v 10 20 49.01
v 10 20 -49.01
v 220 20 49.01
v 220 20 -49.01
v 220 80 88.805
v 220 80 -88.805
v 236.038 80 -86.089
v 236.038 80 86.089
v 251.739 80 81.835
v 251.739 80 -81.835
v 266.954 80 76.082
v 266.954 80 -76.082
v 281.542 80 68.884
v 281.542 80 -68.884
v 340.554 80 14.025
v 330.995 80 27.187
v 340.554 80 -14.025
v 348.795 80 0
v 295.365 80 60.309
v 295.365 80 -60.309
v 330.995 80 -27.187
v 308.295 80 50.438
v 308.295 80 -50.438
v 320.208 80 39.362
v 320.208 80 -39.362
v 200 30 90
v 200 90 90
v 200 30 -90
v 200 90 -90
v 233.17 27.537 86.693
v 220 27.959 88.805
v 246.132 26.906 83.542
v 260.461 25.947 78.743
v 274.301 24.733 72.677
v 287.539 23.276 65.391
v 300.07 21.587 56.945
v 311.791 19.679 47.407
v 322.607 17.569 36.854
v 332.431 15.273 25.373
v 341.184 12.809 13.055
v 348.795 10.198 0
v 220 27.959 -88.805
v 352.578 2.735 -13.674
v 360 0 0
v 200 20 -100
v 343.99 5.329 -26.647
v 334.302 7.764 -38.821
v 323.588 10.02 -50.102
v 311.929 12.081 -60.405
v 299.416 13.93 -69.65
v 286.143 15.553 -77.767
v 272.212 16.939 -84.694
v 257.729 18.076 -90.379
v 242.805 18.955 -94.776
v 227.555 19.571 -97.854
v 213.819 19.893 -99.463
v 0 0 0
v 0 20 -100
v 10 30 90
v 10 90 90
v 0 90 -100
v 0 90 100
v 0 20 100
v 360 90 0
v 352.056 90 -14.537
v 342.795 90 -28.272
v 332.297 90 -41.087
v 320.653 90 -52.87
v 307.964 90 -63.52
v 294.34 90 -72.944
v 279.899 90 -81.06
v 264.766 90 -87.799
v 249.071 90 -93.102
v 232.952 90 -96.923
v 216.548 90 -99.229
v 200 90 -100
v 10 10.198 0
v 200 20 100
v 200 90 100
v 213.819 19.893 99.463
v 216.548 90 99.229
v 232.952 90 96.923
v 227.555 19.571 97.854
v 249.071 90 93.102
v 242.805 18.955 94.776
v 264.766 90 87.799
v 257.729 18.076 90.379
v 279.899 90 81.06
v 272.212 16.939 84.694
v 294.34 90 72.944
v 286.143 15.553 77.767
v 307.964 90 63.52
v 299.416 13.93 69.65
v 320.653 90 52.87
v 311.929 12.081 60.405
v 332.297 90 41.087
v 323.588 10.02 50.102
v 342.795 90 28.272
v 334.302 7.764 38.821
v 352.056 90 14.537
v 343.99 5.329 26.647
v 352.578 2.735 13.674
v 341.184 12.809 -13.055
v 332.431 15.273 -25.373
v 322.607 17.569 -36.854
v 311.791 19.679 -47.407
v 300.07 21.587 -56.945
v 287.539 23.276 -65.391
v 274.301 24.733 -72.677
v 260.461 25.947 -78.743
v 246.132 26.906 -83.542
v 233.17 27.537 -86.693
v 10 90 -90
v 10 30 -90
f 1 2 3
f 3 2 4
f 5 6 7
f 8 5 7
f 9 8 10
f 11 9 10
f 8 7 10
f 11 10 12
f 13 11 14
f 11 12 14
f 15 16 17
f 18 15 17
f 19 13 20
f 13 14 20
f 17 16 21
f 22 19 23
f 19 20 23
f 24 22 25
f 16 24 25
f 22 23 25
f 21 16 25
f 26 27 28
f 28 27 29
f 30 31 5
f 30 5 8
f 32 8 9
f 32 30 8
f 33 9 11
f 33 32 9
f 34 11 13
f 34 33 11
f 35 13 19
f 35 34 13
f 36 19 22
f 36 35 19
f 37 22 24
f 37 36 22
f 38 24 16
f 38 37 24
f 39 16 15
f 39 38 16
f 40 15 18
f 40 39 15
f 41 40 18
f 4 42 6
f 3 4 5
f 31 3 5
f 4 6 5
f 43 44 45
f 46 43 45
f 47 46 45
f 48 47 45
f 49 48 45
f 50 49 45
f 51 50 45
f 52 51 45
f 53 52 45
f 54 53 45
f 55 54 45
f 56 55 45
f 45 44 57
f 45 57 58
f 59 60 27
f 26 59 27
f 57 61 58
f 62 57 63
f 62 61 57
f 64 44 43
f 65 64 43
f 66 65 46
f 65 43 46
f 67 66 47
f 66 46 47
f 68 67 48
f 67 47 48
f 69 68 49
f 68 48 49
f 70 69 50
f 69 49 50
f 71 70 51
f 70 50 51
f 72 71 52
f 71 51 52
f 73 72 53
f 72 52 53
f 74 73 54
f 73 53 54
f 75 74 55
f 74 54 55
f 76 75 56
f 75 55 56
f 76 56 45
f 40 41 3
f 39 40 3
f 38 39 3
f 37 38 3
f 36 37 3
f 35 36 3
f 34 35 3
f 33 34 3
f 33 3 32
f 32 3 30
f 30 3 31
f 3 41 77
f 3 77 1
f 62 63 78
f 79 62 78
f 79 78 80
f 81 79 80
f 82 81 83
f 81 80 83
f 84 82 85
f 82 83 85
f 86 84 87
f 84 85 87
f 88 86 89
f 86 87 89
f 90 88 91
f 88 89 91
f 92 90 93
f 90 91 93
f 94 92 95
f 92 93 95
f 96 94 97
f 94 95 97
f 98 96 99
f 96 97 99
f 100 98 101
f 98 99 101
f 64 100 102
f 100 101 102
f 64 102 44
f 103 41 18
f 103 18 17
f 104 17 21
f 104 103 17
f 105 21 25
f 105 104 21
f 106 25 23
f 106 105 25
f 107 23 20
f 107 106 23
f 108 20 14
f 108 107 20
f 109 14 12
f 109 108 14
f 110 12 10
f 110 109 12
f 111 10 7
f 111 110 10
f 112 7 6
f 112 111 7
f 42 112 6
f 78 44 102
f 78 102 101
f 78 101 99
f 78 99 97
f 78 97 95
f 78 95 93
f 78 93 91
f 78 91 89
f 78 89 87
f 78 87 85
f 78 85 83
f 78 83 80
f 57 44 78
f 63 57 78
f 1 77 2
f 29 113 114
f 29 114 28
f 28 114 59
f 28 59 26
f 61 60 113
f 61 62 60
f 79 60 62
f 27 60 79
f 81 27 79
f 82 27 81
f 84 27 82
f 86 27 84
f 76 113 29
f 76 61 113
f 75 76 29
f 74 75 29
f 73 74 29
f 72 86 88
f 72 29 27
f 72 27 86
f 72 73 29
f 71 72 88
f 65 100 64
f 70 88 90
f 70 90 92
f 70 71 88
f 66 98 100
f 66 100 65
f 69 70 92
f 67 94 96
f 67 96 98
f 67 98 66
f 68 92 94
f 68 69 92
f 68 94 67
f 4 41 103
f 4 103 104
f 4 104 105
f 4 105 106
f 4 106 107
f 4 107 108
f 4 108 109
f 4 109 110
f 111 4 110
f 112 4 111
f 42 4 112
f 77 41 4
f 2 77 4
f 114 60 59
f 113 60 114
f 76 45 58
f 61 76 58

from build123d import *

# Parameters (mm, degrees)
BOSS_EXTRUDE1_DEPTH = 90
CUT_EXTRUDE1_DEPTH  = 385.317577012
SHELL3_T            = -10
BOSS_EXTRUDE2_START = -10
BOSS_EXTRUDE2_DEPTH = 10
SKETCH9_W           = 180
SKETCH9_H           = 60
BOSS_EXTRUDE3_DEPTH = 220
SKETCH9_4_W         = 180
SKETCH9_4_H         = 60
CUT_EXTRUDE3_DEPTH  = 200
SKETCH9_5_W         = 180
SKETCH9_5_H         = 60
BOSS_EXTRUDE5_DEPTH = 10
SKETCH10_W          = 190
SKETCH10_H          = 180
BOSS_EXTRUDE6_DEPTH = 70
SKETCH10_2_W        = 190
SKETCH10_2_H        = 180
CUT_EXTRUDE4_DEPTH  = 30
SKETCH10_3_W        = 190
SKETCH10_3_H        = 180
CUT_EXTRUDE5_DEPTH  = 50
SKETCH10_4_W        = 190
SKETCH10_4_H        = 180
CUT_EXTRUDE6_DEPTH  = 60


with BuildPart() as part:
    # Sketch1 → Boss-Extrude1 (new body)
    with BuildSketch(Plane(origin=(0, 0, 0), x_dir=(1, 0, 0), z_dir=(0, 1, 0))):
        with BuildLine():
            Line((0, 100), (0, -100))
            Line((0, -100), (200, -100))
            ThreePointArc((200, -100), (294.339811321, -72.943698113), (360, 0))
            ThreePointArc((360, 0), (294.339811321, 72.943698113), (200, 100))
            Line((200, 100), (0, 100))
        make_face()
    extrude(amount=BOSS_EXTRUDE1_DEPTH)

    # Sketch2 → Cut-Extrude1 (cut, through all)
    with BuildSketch(Plane.ZY):
        Polygon((-100, 0), (0, 0), (-100, 20), align=None)
        Polygon((100, 20), (0, 0), (100, 0), align=None)
    extrude(amount=-CUT_EXTRUDE1_DEPTH, mode=Mode.SUBTRACT)

    # Shell3
    shell3_openings = [part.faces().sort_by_distance(p)[0] for p in [
        (159.417640867, 90, 0),
    ]]
    offset(amount=SHELL3_T, openings=shell3_openings, kind=Kind.INTERSECTION)

    # Sketch6 → Boss-Extrude2 (add)
    with BuildSketch(Plane(origin=(0, 90, 0), x_dir=(1, 0, 0), z_dir=(0, 1, 0)).offset(BOSS_EXTRUDE2_START)):
        with BuildLine():
            Line((200, 90), (200, -90))
            ThreePointArc((200, -90), (286.948260477, -65.749782609), (348.795161212, 0))
            ThreePointArc((348.795161212, 0), (286.948260477, 65.749782609), (200, 90))
        make_face()
    extrude(amount=BOSS_EXTRUDE2_DEPTH)

    # Sketch9 → Boss-Extrude3 (add)
    with BuildSketch(Plane.ZY):
        with Locations((0, 50)):
            Rectangle(SKETCH9_W, SKETCH9_H)
    extrude(amount=-BOSS_EXTRUDE3_DEPTH)

    # Sketch9<4> → Cut-Extrude3 (cut)
    with BuildSketch(Plane.ZY):
        with Locations((0, 50)):
            Rectangle(SKETCH9_4_W, SKETCH9_4_H)
    extrude(amount=-CUT_EXTRUDE3_DEPTH, mode=Mode.SUBTRACT)

    # Sketch9<5> → Boss-Extrude5 (add)
    with BuildSketch(Plane.ZY):
        with Locations((0, 50)):
            Rectangle(SKETCH9_5_W, SKETCH9_5_H)
    extrude(amount=-BOSS_EXTRUDE5_DEPTH)

    # Sketch10 → Boss-Extrude6 (add)
    with BuildSketch(Plane(origin=(0, 90, 0), x_dir=(1, 0, 0), z_dir=(0, 1, 0))):
        with Locations((105, 0)):
            Rectangle(SKETCH10_W, SKETCH10_H)
    extrude(amount=-BOSS_EXTRUDE6_DEPTH)

    # Sketch10<2> → Cut-Extrude4 (cut)
    with BuildSketch(Plane(origin=(0, 90, 0), x_dir=(1, 0, 0), z_dir=(0, 1, 0))):
        with Locations((105, 0)):
            Rectangle(SKETCH10_2_W, SKETCH10_2_H)
    extrude(amount=-CUT_EXTRUDE4_DEPTH, mode=Mode.SUBTRACT)

    # Sketch10<3> → Cut-Extrude5 (cut)
    with BuildSketch(Plane(origin=(0, 90, 0), x_dir=(1, 0, 0), z_dir=(0, 1, 0))):
        with Locations((105, 0)):
            Rectangle(SKETCH10_3_W, SKETCH10_3_H)
    extrude(amount=-CUT_EXTRUDE5_DEPTH, mode=Mode.SUBTRACT)

    # Sketch10<4> → Cut-Extrude6 (cut)
    with BuildSketch(Plane(origin=(0, 90, 0), x_dir=(1, 0, 0), z_dir=(0, 1, 0))):
        with Locations((105, 0)):
            Rectangle(SKETCH10_4_W, SKETCH10_4_H)
    extrude(amount=-CUT_EXTRUDE6_DEPTH, mode=Mode.SUBTRACT)


solid = part.part
